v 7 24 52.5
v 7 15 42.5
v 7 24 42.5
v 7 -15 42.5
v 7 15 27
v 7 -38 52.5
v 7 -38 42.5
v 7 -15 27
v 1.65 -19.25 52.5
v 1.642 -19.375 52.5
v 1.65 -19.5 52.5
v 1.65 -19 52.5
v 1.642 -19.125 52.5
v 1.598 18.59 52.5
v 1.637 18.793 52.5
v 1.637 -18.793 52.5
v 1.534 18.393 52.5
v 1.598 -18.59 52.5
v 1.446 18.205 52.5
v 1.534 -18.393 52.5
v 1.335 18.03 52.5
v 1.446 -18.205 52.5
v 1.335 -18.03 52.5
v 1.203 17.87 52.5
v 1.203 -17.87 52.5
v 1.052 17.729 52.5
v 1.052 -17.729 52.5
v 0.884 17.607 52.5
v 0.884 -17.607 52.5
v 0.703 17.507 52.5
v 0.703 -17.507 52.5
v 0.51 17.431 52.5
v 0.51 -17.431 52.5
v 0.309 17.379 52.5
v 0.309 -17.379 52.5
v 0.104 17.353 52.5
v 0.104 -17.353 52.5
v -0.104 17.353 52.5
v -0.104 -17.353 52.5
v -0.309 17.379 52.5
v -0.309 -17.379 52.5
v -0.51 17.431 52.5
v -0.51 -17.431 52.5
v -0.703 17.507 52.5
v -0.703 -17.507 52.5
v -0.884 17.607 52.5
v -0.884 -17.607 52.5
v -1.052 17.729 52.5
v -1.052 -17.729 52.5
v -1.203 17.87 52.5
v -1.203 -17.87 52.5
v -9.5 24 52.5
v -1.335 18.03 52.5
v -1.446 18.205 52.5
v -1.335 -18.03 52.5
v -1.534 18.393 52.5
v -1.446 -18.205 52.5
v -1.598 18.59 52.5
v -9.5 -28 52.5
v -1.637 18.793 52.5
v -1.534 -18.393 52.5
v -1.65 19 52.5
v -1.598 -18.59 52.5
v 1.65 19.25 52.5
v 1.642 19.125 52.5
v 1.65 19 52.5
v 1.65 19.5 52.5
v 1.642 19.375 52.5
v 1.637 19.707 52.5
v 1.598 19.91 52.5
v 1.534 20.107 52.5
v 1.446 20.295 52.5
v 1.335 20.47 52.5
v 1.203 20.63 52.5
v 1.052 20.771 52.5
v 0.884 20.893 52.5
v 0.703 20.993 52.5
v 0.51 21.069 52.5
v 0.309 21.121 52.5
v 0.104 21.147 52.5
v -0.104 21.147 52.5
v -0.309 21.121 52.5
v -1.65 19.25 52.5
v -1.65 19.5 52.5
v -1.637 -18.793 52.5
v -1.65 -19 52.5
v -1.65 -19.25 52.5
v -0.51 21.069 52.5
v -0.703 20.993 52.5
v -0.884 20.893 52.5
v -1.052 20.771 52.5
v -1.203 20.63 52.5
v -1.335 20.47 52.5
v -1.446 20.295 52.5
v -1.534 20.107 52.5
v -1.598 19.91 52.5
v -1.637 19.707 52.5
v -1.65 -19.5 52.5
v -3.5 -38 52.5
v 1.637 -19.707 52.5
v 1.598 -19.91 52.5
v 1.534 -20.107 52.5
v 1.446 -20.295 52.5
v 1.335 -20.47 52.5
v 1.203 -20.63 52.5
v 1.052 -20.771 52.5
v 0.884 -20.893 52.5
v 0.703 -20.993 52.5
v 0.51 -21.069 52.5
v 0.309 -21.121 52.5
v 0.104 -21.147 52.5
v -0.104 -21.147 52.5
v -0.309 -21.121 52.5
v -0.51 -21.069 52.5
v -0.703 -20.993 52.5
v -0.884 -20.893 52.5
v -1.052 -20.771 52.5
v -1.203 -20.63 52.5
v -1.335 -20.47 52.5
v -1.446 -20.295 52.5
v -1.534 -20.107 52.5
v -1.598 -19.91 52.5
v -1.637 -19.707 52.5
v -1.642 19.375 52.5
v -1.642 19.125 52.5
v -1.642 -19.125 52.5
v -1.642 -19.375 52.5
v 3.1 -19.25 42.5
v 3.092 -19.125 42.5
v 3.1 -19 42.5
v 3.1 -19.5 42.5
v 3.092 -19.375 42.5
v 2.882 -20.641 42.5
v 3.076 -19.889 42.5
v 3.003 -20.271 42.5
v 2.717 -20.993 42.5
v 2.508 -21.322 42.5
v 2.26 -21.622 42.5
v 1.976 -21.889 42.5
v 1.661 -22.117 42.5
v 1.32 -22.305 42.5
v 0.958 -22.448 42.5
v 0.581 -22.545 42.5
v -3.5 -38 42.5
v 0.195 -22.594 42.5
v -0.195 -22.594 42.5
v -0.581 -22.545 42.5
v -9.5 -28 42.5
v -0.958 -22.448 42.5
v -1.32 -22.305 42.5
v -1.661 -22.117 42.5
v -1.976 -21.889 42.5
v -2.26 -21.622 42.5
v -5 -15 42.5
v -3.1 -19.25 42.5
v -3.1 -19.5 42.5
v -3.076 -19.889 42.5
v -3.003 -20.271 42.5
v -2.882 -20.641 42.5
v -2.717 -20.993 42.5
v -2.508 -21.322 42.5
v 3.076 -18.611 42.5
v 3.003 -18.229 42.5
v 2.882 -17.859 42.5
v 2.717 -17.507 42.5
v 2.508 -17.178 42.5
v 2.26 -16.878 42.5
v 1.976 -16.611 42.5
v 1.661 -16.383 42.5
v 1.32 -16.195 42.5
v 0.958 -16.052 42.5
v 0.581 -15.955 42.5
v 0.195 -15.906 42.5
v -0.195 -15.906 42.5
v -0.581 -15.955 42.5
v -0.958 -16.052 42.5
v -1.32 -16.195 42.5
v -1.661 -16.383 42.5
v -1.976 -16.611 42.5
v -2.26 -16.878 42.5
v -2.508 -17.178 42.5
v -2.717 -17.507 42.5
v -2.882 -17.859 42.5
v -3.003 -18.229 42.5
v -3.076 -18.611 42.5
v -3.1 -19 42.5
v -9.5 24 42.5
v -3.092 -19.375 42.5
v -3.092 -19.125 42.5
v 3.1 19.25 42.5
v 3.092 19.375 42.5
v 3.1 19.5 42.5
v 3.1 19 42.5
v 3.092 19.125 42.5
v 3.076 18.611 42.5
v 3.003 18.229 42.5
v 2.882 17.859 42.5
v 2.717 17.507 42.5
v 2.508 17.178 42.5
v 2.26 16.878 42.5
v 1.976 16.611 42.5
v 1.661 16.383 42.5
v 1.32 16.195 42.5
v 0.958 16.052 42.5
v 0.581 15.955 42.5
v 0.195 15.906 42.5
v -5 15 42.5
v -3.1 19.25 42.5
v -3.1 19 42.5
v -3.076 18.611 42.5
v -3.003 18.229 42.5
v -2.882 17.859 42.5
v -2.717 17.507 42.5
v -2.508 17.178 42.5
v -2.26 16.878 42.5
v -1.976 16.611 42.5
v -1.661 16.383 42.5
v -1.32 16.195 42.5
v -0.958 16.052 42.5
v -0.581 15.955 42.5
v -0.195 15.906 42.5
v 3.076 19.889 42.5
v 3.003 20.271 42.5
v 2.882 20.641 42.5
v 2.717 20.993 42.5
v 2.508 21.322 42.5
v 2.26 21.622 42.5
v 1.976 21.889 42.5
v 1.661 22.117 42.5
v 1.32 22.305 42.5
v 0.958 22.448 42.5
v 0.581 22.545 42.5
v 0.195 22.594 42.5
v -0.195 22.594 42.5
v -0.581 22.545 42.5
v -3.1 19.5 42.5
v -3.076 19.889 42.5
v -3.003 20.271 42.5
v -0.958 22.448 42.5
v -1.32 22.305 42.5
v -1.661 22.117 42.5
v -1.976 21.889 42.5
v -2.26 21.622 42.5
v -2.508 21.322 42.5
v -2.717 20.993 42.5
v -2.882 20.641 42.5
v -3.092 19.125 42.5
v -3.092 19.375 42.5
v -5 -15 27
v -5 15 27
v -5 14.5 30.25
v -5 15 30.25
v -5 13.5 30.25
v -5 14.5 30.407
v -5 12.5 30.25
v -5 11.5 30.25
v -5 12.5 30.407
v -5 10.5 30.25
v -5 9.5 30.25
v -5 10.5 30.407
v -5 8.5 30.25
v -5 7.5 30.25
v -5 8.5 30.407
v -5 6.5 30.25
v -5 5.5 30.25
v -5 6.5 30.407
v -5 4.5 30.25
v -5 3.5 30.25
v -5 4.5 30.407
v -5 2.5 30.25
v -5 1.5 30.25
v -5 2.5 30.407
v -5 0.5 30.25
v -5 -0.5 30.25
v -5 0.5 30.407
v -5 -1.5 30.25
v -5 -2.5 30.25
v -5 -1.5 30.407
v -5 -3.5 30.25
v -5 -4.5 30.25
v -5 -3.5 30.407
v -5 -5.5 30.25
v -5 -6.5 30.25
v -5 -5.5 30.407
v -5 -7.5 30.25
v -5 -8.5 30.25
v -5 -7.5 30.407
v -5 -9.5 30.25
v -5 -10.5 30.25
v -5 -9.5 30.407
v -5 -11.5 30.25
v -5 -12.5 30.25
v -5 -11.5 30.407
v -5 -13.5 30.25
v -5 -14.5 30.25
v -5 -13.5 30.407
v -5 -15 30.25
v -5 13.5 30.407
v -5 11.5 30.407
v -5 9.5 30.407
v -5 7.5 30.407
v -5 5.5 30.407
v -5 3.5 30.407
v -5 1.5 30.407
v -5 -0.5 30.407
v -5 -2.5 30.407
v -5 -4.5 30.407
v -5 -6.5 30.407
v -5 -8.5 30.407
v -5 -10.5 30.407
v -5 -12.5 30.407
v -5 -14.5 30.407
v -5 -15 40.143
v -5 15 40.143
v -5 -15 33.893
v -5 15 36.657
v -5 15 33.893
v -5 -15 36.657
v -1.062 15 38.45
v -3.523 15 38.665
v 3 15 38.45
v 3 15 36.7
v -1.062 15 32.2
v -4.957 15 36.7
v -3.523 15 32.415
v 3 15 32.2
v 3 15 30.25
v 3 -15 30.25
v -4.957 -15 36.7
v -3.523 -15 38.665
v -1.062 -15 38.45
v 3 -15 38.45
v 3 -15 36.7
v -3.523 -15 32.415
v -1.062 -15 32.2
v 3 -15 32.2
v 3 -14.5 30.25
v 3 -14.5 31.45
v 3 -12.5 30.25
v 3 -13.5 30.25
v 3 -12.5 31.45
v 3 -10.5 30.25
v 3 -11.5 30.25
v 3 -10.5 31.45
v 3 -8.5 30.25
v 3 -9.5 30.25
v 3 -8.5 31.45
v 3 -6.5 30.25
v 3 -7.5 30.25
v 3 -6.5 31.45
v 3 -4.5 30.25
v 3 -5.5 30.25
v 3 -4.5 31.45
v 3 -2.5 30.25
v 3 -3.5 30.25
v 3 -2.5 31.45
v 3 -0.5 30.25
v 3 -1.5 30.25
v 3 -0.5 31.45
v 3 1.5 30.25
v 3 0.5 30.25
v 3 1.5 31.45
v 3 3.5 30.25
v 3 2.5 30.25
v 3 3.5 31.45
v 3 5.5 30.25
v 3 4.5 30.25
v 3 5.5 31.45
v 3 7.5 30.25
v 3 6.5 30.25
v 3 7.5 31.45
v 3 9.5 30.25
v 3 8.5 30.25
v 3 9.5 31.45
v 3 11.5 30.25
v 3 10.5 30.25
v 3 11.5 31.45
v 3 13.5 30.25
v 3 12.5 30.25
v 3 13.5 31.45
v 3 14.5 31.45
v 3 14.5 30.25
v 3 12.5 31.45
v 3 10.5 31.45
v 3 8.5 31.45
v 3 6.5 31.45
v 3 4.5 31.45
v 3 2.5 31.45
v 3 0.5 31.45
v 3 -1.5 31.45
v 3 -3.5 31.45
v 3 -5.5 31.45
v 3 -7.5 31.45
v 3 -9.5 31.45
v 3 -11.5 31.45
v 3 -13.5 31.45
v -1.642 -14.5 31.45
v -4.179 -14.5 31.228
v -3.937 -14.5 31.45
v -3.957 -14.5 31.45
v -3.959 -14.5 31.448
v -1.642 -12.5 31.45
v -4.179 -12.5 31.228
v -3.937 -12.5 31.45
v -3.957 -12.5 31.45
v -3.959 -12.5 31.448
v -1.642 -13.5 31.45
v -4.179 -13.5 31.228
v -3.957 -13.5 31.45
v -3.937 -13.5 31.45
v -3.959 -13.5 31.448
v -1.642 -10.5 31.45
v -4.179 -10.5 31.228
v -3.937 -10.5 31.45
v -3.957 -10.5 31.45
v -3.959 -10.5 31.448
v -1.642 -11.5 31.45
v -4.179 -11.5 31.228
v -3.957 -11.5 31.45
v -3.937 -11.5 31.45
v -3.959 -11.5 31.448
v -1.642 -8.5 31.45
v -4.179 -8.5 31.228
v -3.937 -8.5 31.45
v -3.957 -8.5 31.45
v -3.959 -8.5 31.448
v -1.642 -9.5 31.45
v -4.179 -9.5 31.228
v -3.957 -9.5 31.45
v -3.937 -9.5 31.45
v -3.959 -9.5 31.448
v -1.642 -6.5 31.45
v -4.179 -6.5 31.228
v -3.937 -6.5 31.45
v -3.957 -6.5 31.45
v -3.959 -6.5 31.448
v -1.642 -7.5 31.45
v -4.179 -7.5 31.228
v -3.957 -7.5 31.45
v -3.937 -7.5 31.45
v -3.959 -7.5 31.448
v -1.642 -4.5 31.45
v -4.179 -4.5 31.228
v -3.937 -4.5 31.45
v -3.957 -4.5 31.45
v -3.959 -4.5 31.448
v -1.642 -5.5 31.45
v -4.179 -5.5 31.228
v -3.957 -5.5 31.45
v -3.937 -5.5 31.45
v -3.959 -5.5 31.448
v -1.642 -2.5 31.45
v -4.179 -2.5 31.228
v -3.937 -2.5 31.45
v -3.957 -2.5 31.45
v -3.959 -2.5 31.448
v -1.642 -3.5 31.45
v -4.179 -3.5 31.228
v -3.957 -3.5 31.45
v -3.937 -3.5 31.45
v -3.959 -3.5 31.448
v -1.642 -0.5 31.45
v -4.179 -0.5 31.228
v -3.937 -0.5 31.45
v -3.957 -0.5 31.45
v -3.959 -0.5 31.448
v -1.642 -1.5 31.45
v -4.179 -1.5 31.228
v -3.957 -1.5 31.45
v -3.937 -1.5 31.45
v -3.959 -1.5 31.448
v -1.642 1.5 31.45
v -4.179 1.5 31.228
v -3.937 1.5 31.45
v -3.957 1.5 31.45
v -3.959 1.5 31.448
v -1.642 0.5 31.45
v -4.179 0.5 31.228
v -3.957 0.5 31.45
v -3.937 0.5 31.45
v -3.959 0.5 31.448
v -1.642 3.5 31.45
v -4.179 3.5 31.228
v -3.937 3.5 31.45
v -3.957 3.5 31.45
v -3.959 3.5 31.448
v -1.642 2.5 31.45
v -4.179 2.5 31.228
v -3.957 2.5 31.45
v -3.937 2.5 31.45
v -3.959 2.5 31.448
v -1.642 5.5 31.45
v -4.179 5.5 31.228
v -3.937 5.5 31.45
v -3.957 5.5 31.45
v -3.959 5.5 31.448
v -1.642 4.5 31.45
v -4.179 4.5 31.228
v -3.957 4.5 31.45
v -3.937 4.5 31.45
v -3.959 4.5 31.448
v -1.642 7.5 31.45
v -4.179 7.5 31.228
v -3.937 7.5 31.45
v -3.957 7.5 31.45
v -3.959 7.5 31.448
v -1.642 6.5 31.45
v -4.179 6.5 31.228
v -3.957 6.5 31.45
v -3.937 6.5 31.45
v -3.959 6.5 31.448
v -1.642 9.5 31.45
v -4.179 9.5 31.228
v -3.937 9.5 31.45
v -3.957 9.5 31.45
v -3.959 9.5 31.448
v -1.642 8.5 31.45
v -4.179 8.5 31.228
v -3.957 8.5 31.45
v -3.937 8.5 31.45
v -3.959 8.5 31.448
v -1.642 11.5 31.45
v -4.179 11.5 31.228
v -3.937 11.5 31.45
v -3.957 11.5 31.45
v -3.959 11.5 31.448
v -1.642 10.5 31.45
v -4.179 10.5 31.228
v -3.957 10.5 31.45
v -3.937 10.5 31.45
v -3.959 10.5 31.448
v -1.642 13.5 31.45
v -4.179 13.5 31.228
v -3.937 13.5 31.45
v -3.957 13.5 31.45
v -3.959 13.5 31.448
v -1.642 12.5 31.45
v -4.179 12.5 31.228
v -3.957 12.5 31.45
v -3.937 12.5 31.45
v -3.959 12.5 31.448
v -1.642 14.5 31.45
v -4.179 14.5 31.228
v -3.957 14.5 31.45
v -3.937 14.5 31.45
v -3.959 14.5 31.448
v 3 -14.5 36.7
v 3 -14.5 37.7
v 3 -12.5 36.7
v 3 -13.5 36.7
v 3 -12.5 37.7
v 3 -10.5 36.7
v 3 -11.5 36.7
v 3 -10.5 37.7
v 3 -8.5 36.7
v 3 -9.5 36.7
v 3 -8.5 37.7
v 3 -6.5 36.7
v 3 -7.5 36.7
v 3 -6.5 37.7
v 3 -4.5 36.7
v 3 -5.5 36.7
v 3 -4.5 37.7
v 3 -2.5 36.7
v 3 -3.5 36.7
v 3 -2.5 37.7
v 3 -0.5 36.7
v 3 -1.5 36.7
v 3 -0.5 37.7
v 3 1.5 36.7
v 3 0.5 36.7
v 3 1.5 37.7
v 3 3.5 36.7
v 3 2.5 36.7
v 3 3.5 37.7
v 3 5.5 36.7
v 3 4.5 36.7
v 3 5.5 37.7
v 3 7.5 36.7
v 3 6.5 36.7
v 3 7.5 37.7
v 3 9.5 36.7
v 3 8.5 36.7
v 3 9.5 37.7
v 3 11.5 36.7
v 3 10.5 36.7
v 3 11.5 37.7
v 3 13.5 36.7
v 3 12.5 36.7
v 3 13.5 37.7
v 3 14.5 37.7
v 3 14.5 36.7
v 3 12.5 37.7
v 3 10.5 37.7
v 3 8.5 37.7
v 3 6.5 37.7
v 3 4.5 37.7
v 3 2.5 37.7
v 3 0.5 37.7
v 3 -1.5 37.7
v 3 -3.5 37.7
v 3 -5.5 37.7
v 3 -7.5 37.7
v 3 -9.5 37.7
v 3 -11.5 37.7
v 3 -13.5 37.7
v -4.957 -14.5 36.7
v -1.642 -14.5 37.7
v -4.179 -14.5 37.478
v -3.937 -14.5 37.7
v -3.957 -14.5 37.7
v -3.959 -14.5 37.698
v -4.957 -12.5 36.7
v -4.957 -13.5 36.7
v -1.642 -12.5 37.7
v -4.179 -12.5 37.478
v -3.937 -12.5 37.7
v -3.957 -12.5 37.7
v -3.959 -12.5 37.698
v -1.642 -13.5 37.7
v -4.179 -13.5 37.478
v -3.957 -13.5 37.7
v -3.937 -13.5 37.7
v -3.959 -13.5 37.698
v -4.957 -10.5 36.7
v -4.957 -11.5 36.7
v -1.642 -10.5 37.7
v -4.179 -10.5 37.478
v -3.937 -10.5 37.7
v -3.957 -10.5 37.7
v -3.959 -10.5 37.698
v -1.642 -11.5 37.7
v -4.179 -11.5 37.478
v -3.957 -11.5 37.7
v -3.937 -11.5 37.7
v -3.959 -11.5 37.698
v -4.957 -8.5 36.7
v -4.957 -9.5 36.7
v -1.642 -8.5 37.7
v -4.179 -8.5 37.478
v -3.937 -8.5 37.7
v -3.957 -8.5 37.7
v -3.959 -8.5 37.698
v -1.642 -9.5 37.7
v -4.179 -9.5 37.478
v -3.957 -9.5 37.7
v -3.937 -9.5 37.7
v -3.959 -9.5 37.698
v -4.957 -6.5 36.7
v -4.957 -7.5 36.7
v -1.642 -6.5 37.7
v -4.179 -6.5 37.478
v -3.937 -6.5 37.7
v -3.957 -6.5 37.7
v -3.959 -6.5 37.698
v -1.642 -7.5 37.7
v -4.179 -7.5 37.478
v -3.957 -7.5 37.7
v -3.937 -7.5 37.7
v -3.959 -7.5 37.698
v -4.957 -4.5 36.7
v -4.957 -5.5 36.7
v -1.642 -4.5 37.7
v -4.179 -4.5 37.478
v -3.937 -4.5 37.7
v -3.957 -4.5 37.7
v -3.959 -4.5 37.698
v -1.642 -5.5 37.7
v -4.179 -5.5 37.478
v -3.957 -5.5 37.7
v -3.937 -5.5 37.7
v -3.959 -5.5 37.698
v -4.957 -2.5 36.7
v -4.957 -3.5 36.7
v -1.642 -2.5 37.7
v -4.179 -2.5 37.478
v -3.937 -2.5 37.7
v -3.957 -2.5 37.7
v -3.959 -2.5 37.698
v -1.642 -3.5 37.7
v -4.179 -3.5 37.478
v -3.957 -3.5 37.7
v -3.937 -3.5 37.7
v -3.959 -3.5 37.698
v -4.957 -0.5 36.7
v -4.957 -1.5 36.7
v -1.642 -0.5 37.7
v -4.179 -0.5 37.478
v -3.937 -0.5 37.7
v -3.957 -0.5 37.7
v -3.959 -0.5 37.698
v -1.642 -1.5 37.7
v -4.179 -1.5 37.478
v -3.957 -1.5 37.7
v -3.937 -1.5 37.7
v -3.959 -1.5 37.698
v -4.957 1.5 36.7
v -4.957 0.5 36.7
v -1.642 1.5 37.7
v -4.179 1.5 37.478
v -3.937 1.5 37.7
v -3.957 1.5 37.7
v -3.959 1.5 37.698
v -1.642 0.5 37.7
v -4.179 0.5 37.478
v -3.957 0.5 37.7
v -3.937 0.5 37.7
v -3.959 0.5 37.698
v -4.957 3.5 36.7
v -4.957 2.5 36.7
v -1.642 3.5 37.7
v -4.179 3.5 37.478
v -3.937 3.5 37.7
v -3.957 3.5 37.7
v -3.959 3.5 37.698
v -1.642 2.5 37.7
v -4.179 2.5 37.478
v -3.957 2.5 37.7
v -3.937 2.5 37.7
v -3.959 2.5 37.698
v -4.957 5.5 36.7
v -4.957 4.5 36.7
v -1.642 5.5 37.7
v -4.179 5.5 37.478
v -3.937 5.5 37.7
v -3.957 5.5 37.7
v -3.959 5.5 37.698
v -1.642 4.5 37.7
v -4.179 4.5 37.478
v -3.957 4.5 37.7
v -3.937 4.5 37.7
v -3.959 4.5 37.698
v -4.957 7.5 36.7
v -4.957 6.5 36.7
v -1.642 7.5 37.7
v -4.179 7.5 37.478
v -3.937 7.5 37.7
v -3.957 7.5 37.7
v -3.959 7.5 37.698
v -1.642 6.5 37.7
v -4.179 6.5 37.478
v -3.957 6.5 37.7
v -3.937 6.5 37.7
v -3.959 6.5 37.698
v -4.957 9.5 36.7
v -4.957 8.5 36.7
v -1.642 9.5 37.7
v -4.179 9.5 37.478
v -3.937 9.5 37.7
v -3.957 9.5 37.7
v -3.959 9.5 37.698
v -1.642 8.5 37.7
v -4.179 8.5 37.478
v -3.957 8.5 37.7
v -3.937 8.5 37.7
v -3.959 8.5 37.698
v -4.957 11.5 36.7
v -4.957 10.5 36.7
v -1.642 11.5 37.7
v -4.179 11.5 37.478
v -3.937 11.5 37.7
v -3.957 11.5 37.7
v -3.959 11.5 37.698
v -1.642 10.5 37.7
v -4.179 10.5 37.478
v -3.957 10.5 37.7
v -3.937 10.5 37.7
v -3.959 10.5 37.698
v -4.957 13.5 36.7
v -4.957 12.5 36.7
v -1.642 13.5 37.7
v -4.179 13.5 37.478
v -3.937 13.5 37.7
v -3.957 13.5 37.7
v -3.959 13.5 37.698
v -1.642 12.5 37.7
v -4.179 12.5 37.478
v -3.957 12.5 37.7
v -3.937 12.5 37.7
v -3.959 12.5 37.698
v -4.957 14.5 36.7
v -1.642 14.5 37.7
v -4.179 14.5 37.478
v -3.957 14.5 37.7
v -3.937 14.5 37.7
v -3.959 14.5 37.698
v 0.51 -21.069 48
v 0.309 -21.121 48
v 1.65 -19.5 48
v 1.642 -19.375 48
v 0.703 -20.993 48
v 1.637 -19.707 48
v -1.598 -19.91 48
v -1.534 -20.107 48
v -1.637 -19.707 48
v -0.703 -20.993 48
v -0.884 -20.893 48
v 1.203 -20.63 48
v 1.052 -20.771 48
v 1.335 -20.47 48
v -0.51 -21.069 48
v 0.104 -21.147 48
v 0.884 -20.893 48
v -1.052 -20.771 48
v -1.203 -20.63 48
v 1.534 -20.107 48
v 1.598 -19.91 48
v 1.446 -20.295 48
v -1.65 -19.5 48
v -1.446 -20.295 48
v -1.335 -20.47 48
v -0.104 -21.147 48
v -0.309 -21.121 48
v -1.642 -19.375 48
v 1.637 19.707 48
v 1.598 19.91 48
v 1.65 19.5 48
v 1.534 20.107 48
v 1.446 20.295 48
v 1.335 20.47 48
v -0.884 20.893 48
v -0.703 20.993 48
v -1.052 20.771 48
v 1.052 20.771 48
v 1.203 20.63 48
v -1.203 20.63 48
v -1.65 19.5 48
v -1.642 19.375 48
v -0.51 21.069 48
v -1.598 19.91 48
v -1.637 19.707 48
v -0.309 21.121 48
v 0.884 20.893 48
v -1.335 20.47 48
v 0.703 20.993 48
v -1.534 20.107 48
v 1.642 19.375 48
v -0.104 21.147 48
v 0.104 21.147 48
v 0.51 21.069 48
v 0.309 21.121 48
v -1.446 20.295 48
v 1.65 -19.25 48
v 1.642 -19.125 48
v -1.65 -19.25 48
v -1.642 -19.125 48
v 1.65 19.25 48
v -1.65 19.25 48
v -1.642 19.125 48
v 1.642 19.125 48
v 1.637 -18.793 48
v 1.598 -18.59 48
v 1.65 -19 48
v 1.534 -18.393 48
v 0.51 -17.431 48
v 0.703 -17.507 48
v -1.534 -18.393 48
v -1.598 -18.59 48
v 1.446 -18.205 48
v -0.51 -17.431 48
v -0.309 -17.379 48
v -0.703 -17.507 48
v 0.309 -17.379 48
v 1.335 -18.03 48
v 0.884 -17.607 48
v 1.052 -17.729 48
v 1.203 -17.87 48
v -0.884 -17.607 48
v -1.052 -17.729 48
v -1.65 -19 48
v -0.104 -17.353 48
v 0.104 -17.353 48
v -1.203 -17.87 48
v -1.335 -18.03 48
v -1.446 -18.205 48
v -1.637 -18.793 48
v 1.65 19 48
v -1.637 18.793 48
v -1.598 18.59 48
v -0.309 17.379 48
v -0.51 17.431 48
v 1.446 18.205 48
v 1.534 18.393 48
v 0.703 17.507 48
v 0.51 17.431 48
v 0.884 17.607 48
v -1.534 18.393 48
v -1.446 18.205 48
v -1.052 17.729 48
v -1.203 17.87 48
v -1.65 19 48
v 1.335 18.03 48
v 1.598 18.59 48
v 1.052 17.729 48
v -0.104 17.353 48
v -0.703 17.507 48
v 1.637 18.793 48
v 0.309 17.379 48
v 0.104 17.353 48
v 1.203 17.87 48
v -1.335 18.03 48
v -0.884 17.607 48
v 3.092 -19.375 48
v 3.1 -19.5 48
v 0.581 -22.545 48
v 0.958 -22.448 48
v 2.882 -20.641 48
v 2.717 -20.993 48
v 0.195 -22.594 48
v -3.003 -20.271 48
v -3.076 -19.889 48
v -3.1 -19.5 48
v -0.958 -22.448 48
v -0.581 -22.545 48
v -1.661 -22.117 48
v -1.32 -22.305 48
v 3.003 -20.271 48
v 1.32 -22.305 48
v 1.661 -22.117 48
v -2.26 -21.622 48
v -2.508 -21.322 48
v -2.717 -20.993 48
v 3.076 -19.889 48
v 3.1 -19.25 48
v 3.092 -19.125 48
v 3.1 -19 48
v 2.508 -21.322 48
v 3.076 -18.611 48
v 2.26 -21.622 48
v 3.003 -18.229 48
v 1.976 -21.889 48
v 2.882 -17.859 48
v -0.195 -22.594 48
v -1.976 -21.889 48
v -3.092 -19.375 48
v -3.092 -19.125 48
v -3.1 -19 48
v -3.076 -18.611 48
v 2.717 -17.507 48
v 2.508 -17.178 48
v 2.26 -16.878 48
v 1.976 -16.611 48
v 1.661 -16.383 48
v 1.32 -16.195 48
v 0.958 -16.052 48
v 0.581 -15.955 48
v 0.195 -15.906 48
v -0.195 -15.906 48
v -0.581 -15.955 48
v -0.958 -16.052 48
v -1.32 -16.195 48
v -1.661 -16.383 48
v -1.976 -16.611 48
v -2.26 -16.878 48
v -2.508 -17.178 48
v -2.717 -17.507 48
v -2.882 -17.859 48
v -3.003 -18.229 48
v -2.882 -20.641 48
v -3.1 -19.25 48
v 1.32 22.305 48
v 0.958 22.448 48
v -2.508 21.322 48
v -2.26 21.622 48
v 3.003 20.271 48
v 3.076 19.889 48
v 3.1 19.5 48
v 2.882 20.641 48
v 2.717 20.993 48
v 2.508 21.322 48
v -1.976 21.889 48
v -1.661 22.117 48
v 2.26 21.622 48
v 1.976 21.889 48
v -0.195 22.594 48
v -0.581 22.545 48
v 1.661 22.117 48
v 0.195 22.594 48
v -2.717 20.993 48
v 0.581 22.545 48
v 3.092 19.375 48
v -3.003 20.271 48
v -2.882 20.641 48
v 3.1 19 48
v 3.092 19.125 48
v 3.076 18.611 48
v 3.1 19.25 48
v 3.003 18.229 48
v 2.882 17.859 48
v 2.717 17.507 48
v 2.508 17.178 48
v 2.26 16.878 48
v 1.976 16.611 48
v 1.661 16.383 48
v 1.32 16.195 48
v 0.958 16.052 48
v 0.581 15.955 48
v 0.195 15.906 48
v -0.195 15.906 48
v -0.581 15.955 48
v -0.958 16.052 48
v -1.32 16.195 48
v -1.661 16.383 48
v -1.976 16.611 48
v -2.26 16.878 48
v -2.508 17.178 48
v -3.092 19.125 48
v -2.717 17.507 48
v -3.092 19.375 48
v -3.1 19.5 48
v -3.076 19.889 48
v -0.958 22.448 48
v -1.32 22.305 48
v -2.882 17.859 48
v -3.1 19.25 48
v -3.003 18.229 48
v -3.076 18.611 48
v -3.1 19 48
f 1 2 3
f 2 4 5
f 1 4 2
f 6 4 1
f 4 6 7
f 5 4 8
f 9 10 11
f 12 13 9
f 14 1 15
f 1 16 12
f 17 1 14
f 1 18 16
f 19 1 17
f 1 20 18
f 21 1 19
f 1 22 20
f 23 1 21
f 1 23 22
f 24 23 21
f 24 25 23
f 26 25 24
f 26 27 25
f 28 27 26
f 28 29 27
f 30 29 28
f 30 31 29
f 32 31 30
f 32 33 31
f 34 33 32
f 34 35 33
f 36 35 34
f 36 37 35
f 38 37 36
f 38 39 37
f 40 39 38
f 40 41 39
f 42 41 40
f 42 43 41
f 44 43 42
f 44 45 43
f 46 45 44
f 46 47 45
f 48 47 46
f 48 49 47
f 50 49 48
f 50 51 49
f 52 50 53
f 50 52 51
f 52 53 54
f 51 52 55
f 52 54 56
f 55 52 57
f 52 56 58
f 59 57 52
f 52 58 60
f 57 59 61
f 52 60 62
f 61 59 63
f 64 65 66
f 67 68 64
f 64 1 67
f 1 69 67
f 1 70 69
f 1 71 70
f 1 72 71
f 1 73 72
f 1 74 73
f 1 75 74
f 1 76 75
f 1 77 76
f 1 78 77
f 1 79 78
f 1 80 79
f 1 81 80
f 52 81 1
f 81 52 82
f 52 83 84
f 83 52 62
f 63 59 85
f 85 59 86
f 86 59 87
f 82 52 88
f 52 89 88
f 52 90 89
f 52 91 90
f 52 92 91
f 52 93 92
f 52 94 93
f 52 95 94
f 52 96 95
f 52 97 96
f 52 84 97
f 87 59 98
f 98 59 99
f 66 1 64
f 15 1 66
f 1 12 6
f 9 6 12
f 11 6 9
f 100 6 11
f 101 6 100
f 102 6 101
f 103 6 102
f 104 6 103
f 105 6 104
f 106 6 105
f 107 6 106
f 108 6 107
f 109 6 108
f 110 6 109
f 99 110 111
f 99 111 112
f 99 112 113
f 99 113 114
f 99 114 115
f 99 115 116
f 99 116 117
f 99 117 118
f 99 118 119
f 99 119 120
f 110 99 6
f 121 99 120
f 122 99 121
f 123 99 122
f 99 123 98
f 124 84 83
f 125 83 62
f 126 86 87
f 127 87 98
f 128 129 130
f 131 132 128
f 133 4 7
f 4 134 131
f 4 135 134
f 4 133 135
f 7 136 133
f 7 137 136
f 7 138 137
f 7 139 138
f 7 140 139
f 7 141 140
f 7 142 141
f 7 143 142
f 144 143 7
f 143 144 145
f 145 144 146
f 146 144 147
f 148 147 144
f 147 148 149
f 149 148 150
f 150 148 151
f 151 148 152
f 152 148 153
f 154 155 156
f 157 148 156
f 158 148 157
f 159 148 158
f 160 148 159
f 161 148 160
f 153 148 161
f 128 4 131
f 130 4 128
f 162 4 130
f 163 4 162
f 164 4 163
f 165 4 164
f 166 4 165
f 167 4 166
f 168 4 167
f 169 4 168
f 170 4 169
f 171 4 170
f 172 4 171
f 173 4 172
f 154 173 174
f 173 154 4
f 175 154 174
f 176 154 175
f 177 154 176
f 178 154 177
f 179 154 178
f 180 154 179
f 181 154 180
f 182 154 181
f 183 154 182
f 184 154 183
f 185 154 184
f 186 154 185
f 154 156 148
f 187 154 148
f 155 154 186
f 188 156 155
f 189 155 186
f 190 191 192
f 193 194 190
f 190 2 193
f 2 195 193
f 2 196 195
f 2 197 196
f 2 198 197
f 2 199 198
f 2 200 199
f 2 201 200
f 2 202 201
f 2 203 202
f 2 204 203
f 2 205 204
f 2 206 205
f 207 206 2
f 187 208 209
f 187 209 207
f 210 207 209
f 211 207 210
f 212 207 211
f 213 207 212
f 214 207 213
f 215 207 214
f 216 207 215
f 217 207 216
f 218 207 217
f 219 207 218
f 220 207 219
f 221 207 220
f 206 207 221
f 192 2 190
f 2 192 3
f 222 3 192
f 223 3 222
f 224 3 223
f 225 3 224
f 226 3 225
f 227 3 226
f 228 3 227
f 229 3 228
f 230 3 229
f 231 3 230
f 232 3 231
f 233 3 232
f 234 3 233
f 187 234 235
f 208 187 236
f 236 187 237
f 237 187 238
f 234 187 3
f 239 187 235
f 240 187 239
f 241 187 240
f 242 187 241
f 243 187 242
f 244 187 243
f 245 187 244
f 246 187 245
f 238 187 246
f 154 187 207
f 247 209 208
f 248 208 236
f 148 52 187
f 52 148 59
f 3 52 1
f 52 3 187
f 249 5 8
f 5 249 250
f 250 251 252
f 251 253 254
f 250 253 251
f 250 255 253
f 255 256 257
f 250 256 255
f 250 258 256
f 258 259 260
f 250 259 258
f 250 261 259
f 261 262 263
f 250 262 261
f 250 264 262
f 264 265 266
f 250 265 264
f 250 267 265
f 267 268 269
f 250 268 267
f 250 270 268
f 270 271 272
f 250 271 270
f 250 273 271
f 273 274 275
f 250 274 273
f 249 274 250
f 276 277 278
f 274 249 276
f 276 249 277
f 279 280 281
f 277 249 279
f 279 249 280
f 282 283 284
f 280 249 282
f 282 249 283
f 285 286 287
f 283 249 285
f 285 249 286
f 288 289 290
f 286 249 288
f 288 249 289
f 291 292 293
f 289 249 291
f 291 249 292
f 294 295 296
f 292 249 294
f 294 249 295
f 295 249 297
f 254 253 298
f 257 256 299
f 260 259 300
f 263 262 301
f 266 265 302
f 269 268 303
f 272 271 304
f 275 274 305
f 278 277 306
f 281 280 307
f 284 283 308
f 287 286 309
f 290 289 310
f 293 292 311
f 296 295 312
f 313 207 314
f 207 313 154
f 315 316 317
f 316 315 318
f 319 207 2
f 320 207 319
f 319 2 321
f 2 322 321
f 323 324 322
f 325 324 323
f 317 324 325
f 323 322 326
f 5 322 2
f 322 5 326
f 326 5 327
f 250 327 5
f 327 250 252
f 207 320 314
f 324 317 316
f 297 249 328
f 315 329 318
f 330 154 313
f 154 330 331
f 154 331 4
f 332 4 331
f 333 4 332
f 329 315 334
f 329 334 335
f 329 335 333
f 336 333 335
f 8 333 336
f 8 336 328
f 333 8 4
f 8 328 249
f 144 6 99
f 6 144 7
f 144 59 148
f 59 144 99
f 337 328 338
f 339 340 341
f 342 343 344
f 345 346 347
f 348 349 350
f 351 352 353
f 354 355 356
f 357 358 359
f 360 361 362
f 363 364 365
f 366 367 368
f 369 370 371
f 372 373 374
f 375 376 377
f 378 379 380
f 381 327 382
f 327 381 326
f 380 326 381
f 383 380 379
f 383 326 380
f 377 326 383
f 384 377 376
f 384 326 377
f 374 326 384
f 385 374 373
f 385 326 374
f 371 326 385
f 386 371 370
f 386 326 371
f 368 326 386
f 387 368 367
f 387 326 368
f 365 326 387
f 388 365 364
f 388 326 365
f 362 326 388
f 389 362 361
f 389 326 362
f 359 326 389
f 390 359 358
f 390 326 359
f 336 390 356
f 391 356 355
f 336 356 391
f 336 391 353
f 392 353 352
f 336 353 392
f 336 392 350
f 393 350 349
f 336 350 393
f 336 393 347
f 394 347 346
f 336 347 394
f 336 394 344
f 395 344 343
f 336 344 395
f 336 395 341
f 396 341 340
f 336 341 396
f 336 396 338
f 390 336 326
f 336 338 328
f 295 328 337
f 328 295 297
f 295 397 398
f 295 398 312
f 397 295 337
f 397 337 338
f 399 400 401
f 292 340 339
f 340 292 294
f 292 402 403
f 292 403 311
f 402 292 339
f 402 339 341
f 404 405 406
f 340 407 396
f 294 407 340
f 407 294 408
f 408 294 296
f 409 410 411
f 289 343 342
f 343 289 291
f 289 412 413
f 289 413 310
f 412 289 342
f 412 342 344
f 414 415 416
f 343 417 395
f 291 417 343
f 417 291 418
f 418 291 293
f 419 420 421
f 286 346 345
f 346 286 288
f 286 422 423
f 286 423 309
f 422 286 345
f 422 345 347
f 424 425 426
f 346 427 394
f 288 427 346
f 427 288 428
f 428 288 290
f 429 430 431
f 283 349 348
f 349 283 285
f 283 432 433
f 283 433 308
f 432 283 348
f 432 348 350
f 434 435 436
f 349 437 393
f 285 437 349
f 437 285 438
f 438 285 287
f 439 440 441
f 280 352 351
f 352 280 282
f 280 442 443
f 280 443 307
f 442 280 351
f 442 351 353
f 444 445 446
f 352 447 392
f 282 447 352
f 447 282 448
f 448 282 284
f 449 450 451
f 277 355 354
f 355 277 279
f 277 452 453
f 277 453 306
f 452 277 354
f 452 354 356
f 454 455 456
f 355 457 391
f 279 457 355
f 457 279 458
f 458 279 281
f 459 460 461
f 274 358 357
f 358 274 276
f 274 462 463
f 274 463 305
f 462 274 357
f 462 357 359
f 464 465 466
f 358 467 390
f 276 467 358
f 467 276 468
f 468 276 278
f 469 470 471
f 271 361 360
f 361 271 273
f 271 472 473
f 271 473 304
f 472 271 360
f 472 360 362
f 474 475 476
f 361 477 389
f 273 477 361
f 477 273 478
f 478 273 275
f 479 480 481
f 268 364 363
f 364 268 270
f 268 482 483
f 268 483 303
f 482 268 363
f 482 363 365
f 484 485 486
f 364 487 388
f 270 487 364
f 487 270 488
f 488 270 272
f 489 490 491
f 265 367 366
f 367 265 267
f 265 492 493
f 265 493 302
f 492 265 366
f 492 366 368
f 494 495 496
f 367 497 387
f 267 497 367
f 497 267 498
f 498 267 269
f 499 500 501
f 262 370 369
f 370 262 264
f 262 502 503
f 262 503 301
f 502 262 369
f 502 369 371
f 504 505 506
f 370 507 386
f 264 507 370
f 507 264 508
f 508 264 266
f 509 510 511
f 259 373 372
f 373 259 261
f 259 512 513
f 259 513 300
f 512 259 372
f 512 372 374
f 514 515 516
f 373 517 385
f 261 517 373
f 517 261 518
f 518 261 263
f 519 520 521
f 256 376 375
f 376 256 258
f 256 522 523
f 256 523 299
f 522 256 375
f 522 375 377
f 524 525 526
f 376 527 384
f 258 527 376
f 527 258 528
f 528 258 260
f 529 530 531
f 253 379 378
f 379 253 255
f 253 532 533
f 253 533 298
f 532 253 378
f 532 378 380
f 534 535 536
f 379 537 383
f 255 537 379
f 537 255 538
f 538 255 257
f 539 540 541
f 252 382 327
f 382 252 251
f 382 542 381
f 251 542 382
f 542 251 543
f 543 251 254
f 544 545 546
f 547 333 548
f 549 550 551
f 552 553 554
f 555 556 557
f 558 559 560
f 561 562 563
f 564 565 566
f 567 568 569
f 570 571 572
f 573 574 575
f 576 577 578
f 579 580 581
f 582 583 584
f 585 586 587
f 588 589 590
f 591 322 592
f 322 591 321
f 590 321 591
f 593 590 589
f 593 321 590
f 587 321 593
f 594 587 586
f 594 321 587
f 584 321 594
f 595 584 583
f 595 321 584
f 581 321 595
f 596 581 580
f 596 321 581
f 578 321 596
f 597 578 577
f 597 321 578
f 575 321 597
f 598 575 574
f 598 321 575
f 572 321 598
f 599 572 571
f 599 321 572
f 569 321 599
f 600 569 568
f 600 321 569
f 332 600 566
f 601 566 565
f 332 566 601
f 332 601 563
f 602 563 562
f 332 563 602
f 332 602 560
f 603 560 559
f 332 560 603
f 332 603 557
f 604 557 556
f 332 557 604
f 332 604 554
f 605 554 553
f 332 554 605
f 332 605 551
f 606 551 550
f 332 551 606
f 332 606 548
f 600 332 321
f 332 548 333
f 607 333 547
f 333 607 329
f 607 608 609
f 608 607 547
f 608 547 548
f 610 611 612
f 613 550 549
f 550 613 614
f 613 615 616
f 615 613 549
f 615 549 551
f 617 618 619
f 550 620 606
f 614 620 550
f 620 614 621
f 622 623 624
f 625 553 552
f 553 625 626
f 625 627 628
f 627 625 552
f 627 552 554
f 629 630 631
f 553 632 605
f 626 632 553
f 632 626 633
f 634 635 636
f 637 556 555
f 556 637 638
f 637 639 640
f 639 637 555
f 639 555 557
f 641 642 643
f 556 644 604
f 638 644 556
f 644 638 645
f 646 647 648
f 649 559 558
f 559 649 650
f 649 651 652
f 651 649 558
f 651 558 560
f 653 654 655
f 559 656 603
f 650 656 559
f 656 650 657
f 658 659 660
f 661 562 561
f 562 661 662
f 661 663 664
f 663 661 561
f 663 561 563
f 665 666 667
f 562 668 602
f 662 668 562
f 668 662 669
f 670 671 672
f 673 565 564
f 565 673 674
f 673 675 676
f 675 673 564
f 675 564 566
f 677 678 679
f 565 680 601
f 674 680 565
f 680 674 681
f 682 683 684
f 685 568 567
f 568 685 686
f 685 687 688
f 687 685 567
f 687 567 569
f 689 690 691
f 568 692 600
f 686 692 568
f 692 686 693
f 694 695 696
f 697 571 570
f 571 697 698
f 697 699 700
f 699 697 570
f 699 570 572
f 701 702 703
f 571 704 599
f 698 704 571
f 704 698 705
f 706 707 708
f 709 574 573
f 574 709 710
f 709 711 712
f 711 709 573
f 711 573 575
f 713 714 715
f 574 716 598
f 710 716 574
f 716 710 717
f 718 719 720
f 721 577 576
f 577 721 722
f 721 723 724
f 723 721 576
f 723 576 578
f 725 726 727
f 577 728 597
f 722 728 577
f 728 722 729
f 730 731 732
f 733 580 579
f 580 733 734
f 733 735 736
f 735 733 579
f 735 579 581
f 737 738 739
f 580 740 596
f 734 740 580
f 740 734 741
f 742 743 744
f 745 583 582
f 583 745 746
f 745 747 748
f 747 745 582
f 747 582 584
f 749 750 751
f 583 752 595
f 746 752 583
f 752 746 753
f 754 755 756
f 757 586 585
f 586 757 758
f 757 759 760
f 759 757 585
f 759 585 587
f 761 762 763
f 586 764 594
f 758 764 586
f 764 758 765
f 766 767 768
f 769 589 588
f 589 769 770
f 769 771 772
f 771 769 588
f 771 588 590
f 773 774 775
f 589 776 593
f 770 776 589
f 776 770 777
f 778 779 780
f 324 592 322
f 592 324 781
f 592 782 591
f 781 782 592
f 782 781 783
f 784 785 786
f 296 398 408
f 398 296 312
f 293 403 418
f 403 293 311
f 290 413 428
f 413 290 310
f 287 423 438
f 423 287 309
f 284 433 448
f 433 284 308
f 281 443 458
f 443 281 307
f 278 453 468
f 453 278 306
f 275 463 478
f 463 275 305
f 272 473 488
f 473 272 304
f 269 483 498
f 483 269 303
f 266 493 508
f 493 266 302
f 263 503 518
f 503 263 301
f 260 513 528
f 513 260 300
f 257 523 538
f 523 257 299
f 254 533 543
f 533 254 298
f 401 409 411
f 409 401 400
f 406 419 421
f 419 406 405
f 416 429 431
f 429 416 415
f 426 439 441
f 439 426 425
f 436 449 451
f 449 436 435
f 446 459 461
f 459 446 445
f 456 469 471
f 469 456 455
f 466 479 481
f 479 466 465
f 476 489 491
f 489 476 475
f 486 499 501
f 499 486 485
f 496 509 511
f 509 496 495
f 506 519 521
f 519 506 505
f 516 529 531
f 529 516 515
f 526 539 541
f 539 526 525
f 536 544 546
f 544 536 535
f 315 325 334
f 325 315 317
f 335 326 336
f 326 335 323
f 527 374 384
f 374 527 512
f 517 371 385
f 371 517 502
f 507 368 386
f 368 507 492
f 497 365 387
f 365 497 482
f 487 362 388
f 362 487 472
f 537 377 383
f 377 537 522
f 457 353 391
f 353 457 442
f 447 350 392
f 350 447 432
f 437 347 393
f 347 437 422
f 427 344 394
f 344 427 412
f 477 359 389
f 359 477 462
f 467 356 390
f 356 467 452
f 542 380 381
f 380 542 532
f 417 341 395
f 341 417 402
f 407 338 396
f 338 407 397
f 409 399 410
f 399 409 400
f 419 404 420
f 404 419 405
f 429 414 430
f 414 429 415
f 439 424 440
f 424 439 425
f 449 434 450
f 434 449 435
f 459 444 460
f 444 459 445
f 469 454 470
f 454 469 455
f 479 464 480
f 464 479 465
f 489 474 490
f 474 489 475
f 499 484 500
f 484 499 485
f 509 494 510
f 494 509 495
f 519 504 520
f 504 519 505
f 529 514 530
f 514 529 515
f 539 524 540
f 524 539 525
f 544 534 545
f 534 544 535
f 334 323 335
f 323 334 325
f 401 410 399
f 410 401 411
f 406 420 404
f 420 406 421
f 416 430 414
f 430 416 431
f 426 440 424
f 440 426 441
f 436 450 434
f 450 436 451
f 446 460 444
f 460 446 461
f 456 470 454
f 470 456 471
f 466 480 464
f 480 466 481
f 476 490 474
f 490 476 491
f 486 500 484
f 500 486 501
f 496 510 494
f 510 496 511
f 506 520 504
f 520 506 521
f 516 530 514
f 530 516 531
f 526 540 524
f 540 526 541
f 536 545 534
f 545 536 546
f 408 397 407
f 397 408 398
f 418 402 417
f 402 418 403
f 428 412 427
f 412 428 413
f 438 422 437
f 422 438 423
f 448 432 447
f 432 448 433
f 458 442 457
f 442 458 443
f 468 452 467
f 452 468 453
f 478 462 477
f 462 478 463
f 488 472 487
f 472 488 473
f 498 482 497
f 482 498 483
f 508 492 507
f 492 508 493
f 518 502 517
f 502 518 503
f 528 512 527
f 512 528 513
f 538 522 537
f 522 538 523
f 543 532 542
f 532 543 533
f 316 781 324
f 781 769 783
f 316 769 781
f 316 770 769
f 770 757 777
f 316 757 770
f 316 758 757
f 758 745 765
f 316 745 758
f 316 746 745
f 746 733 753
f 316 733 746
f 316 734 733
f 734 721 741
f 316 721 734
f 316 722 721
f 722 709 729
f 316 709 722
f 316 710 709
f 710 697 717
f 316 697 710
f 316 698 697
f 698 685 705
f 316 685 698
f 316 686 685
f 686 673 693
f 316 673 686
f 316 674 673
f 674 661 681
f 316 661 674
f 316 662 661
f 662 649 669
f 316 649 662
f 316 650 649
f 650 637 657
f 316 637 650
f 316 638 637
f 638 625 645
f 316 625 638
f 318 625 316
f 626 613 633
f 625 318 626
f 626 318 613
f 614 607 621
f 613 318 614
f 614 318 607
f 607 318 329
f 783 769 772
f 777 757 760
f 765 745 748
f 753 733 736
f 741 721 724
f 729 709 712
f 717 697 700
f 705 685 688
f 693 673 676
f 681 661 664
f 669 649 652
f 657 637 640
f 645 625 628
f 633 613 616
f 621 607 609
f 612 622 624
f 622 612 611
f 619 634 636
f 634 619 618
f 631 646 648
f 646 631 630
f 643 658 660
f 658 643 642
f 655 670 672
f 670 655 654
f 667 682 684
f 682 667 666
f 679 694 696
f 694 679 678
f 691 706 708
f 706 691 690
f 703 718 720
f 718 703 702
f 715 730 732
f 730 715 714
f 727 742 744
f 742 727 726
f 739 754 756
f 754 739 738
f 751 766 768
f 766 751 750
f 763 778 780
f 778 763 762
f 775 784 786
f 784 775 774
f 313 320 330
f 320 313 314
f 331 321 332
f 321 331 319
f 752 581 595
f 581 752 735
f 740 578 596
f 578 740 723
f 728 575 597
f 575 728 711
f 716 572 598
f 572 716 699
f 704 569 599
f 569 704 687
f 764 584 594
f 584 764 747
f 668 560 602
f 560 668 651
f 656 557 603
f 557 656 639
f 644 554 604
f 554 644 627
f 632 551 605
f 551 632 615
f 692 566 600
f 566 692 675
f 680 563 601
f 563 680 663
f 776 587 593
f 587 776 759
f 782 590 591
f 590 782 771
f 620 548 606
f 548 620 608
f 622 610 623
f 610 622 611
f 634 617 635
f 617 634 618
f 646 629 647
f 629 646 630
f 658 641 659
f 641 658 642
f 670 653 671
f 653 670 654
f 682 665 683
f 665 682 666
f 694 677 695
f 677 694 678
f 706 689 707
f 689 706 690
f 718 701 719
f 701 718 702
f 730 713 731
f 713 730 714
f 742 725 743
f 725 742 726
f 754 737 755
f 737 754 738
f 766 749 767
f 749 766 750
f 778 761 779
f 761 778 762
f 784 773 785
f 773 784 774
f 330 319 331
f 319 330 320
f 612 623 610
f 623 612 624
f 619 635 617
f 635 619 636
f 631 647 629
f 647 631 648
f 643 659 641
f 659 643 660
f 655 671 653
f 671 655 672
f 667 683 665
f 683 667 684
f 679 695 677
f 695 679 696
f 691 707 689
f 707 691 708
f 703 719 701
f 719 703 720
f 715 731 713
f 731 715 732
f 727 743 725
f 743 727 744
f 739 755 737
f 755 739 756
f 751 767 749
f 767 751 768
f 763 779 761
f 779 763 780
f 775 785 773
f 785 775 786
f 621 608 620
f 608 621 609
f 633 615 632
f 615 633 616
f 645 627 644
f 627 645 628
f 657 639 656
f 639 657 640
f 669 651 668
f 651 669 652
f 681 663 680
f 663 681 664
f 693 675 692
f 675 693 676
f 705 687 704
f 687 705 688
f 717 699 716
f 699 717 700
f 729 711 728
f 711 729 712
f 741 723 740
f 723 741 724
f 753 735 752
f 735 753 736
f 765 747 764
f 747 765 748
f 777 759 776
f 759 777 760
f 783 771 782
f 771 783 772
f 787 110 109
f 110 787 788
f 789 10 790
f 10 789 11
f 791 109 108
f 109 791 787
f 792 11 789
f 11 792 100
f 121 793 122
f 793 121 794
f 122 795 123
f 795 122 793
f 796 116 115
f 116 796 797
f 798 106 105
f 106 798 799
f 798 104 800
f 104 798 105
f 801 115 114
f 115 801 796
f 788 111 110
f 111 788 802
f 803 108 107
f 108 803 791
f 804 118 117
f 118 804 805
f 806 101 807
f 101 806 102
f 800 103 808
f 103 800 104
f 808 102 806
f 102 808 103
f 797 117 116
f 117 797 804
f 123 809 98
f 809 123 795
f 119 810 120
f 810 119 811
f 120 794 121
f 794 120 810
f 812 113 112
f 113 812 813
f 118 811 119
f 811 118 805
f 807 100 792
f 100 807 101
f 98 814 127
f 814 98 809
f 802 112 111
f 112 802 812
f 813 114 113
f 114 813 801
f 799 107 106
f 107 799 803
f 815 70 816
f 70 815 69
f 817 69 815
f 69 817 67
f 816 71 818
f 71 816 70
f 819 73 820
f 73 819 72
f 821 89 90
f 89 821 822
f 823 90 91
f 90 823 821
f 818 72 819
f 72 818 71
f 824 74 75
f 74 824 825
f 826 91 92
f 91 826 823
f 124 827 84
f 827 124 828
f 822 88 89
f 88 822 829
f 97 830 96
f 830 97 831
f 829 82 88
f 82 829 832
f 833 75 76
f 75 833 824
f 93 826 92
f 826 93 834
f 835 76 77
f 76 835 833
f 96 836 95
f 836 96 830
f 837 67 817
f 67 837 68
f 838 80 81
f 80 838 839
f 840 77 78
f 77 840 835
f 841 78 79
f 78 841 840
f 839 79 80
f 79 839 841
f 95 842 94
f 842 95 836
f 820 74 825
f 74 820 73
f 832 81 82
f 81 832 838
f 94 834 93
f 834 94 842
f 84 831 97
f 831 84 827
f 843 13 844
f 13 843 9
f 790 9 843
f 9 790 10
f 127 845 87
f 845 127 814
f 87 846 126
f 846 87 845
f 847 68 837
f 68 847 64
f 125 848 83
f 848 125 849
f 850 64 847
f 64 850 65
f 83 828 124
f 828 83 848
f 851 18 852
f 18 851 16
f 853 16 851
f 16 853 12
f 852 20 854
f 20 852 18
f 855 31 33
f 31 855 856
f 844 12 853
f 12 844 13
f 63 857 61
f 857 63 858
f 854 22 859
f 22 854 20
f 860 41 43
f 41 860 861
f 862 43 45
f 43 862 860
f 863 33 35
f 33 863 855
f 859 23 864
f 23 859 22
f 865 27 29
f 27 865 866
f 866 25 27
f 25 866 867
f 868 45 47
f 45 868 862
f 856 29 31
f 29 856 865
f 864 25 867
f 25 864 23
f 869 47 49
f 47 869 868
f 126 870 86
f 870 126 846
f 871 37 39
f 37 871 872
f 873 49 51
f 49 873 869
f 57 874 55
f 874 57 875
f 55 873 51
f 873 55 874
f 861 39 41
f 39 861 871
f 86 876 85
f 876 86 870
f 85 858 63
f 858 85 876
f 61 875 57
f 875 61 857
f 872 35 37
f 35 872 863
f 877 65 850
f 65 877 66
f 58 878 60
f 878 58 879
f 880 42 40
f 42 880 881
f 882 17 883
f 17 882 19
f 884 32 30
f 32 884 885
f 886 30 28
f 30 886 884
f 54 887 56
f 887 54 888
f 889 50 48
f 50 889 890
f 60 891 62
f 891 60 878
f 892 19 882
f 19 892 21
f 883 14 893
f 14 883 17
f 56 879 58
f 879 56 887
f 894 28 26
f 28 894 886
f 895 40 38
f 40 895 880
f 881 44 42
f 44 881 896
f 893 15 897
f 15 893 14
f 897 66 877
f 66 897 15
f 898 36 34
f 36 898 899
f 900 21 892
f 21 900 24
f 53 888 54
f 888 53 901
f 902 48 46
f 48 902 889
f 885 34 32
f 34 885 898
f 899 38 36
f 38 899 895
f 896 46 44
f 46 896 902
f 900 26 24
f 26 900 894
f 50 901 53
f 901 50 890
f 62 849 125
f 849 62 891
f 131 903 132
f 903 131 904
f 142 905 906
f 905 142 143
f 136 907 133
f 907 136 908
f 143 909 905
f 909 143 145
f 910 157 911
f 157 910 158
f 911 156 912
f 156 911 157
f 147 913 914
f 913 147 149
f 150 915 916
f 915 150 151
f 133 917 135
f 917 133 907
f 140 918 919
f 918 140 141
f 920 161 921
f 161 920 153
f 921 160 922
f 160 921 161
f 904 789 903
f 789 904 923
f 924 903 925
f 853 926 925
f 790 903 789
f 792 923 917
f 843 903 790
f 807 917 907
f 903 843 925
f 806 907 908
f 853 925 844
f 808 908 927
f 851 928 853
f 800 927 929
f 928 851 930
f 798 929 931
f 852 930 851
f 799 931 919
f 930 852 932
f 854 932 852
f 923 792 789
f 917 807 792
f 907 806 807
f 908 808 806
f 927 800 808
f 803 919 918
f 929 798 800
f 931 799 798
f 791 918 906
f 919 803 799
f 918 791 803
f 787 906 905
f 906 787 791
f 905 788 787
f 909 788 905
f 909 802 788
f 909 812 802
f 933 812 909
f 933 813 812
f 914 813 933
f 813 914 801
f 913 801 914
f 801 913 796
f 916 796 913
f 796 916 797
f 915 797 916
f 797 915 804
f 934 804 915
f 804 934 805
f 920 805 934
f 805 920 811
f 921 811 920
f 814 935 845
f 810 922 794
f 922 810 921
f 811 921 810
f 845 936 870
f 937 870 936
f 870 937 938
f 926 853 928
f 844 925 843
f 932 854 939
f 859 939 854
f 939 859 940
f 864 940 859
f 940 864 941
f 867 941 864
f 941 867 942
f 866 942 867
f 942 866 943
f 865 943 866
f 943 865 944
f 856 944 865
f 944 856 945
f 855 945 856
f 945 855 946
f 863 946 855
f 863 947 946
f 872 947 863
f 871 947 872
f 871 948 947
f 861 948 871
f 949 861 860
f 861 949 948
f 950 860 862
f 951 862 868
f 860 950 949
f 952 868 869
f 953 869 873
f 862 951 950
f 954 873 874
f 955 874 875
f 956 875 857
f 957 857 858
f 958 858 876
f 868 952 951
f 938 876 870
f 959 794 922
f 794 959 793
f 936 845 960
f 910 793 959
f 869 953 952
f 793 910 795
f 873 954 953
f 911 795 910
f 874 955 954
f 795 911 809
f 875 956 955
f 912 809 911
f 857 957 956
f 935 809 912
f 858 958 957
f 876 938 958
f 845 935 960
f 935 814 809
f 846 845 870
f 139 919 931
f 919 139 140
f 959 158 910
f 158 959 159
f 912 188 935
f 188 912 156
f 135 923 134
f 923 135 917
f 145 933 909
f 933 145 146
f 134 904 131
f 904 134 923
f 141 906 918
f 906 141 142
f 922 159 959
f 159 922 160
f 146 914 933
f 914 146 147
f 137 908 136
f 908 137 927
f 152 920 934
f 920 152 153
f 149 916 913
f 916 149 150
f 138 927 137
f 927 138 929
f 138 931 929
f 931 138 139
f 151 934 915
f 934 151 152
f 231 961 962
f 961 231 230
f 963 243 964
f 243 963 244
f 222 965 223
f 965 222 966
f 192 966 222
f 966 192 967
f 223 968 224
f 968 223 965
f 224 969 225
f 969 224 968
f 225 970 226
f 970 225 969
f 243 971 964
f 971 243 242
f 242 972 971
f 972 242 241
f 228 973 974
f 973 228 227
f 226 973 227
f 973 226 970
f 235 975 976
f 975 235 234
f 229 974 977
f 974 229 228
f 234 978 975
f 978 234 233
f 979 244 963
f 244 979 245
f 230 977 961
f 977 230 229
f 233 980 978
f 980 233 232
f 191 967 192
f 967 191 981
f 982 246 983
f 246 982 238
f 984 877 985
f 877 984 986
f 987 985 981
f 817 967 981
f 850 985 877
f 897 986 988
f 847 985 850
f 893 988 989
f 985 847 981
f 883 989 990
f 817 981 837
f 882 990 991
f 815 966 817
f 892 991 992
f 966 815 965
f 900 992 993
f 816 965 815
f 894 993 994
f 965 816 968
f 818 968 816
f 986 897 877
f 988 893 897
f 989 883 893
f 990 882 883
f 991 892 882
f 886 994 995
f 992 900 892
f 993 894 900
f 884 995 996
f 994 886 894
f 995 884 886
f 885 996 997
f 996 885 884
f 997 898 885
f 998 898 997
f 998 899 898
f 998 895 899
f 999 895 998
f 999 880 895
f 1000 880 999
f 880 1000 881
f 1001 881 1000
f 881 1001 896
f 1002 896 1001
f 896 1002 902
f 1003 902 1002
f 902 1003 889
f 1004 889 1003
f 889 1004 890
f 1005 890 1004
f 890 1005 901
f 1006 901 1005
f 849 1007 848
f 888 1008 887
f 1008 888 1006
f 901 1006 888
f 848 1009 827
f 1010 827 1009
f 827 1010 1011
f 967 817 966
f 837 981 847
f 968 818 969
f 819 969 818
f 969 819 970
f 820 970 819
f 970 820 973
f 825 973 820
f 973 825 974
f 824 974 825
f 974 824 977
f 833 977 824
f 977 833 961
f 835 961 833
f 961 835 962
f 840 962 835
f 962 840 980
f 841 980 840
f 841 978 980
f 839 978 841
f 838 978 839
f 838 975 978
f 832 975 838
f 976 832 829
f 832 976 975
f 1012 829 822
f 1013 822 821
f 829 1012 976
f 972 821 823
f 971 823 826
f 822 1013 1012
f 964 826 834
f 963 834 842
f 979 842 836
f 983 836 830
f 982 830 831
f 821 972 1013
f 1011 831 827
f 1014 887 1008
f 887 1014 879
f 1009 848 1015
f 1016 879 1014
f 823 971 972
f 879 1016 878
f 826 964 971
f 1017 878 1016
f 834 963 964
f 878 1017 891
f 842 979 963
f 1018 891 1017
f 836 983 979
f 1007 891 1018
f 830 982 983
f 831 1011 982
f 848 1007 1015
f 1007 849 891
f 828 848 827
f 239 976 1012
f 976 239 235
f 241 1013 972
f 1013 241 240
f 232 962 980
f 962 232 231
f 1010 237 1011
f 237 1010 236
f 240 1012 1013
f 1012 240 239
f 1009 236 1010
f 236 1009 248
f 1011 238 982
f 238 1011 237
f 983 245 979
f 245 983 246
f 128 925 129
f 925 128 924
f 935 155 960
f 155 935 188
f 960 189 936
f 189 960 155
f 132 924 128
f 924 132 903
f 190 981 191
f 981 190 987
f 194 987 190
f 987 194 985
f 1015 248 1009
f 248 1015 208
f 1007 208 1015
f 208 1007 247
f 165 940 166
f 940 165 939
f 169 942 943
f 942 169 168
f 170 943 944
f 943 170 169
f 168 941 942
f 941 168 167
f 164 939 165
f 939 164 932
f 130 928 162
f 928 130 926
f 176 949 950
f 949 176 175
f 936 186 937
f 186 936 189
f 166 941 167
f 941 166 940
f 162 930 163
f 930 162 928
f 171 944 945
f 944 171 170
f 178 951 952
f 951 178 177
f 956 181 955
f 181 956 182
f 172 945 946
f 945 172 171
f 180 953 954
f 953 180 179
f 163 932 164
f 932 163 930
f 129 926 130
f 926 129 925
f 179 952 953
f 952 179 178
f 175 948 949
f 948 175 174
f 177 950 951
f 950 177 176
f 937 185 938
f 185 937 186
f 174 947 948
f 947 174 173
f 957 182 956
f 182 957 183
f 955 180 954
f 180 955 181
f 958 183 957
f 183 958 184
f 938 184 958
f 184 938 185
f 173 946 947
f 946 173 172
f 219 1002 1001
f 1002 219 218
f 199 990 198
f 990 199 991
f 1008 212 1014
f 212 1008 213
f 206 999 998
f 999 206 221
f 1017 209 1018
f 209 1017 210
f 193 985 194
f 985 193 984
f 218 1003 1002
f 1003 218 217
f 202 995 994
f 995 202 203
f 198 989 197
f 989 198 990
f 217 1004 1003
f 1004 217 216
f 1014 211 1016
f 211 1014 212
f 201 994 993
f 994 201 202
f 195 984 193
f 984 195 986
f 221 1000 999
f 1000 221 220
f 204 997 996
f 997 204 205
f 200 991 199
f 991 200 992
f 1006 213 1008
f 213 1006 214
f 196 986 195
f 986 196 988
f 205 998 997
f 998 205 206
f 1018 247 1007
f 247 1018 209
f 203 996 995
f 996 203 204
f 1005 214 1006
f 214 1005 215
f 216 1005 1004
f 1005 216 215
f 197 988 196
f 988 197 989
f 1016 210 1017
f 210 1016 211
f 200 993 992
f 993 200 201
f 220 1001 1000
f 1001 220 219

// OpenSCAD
// Copy from Prusa Original:
// PRUSA iteration4
// Y belt holder
// GNU GPL v3
// Josef Průša <iam@josefprusa.cz> and contributors
// http://www.reprap.org/wiki/Prusa_Mendel
// http://prusamendel.org

// This should not require any changes to fit the Dusa?
// Plenty changes.

module y_belt_holder()
{

    difference()
    {
        // base block
        union()
        {
            translate([-9.5,-24,42.5]) cube([16.5,48,10]);
            translate([-5,-15,27]) cube([12,30,19]);
            
        // add ramp for endstop
        color("orange")
        translate([-9.5,-24,42.5])
        linear_extrude(height=10)
        polygon([ [16.5,0], [16.5,-14], [6,-14], [0,-4], [0,0] ]);
        }

        // lower belt entry
        translate([-7.5,-16,34.9-2.75]) rotate([0,45,0]) cube([3,32,3]);
        
        // lower belt slot
        translate([-8.5,-16,34.2-2.75]) cube([11.5,32,0.75]);
        translate([-8.5,-16,35.4-2.75]) rotate([0,5,0]) cube([11.5,32,0.2]);
        translate([-8.5,-16,33.6-2.75]) rotate([0,-5,0]) cube([11.5,32,0.2]);
        for (_step =[-16:2:16])
        {
            translate([-8.5,_step+0.5,33-2.75]) cube([11.5,1,1.5]);
        }
        
        // upper belt entry 
        translate([-7.5,-16,39.9-1.5]) rotate([0,45,0]) cube([3,32,3]);

        // upper belt slot
        translate([-8.5,-16,39.2-1.5]) cube([11.5,32,0.75]);
        translate([-8.5,-16,40.4-1.5]) rotate([0,5,0]) cube([11.5,32,0.2]);
        translate([-8.5,-16,38.6-1.5]) rotate([0,-5,0]) cube([11.5,32,0.2]);
        for (_step =[-17:2:16])
        {
            translate([-8.5,_step-0.5,38.2-1.5]) cube([11.5,1,1.5]);
        }
        
        // mounting screw holes, these are double cut to make slight oval
        translate([0,-19.50,40]) cylinder( h=30, r=1.65, $fn=50 );
        translate([0,19.50,40]) cylinder( h=30, r=1.65, $fn=50 );
        translate([0,-19.25,40]) cylinder( h=30, r=1.65, $fn=50 );
        translate([0,19.25,40]) cylinder( h=30, r=1.65, $fn=50 );
        translate([0,-19.0,40]) cylinder( h=30, r=1.65, $fn=50 );
        translate([0,19.0,40]) cylinder( h=30, r=1.65, $fn=50 );
        
        translate([0,-19.5,42]) cylinder( h=6, r=3.1, $fn=50 );
        translate([0,19.5,42]) cylinder( h=6, r=3.1, $fn=50 );
        translate([0,-19.25,42]) cylinder( h=6, r=3.1, $fn=50 );
        translate([0,19.25,42]) cylinder( h=6, r=3.1, $fn=50 );
        translate([0,-19.0,42]) cylinder( h=6, r=3.1, $fn=50 );
        translate([0,19.0,42]) cylinder( h=6, r=3.1, $fn=50 );
        
    
    }
 

}


//===========================================

y_belt_holder();



/*
difference()
{
    translate([-40,0,7]) rotate([0,90,0]) y_belt_holder();
    //version   
    translate([8.5,3.5,0.5]) rotate([0,180,90]) linear_extrude(height = 0.6) 
    { text("R2",font = "helvetica:style=Bold", size=4, center=true); }
}
  */  
